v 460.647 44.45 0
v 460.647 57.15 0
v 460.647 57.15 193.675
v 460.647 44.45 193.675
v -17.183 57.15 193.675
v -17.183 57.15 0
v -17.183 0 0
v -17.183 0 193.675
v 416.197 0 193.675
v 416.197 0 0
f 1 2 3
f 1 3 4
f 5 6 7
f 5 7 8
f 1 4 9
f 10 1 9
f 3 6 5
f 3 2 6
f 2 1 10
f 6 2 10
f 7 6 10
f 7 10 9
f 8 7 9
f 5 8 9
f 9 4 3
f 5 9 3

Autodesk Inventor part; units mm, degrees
ref_plane "YZ Plane" through (0, 0, 0) normal (1, 0, 0) x (0, 1, 0)
ref_plane "XZ Plane" through (0, 0, 0) normal (0, 1, 0) x (-1, 0, 0)
ref_plane "XY Plane" through (0, 0, 0) normal (0, 0, 1) x (1, 0, 0)
sketch "Sketch1" plane through (0, 0, 0) normal (1, 0, 0) x (0, 1, 0)
  line L0 (0, 0) -> (57.15, 0)
  line L1 (57.15, 0) -> (57.15, 193.675)
  line L2 (57.15, 193.675) -> (0, 193.675)
  line L3 (0, 193.675) -> (0, 0)
  dimension "d0" = 57.15
  dimension "d1" = 193.675
extrude "Extrusion1" add sketch "Sketch1" along normal blind 477.8375
sketch "Sketch3" plane through (0, 0, 0) normal (0, 0, -1) x (-1, 0, 0)
  line L0 (-477.8375, 0) -> (-397.0152, 0) construction
  line L1 (-477.8375, 57.15) -> (-477.8375, 0)
  line L2 (0, 0) -> (-477.8375, 0) projected
  line L3 (-477.8375, 57.15) -> (-420.6875, 0)
  line L4 (-477.8375, 57.15) -> (-477.8375, 0) projected
  line L5 (-477.8375, 0) -> (-420.6875, 0)
extrude "Extrusion3" cut sketch "Sketch3" against normal up to surface (193.675 mm away)
thicken "Thicken1" operation add thickness 3.175 both sides no extend neighbours yes toward (-0.7071068, 0.7071068, 0) faces at (458.7875, 38.1, 129.1167)
sketch "Sketch4" plane through (0, 0, 0) normal (0, 0, -1) x (-1, 0, 0)
  line L0 (0, 57.15) -> (-473.3474, 57.15) projected
  line L1 (-460.6474, 57.15) -> (-460.6474, 44.45)
  line L2 (-473.3474, 57.15) -> (-416.1974, 0) projected
  line L3 (-473.3474, 57.15) -> (-460.6474, 57.15)
  line L4 (-460.6474, 44.45) -> (-473.3474, 57.15)
  point P0 (0, 0)
  dimension "d17" = 12.7
extrude "Extrusion4" cut sketch "Sketch4" against normal blind 193.675
sketch "Sketch6" plane through (0, 0, 0) normal (-1, 0, 0) x (0, 0, 1)
  line L0 (0, 57.15) -> (193.675, 57.15) projected
  line L1 (0, 0) -> (193.675, 0)
  line L2 (193.675, 0) -> (193.675, 57.15)
  line L3 (193.675, 57.15) -> (0, 57.15)
  line L4 (0, 57.15) -> (0, 0)
extrude "Extrusion5" add sketch "Sketch6" along normal blind 17.1831
properties part number "1-80" material "Granite, Cut, Polished"
